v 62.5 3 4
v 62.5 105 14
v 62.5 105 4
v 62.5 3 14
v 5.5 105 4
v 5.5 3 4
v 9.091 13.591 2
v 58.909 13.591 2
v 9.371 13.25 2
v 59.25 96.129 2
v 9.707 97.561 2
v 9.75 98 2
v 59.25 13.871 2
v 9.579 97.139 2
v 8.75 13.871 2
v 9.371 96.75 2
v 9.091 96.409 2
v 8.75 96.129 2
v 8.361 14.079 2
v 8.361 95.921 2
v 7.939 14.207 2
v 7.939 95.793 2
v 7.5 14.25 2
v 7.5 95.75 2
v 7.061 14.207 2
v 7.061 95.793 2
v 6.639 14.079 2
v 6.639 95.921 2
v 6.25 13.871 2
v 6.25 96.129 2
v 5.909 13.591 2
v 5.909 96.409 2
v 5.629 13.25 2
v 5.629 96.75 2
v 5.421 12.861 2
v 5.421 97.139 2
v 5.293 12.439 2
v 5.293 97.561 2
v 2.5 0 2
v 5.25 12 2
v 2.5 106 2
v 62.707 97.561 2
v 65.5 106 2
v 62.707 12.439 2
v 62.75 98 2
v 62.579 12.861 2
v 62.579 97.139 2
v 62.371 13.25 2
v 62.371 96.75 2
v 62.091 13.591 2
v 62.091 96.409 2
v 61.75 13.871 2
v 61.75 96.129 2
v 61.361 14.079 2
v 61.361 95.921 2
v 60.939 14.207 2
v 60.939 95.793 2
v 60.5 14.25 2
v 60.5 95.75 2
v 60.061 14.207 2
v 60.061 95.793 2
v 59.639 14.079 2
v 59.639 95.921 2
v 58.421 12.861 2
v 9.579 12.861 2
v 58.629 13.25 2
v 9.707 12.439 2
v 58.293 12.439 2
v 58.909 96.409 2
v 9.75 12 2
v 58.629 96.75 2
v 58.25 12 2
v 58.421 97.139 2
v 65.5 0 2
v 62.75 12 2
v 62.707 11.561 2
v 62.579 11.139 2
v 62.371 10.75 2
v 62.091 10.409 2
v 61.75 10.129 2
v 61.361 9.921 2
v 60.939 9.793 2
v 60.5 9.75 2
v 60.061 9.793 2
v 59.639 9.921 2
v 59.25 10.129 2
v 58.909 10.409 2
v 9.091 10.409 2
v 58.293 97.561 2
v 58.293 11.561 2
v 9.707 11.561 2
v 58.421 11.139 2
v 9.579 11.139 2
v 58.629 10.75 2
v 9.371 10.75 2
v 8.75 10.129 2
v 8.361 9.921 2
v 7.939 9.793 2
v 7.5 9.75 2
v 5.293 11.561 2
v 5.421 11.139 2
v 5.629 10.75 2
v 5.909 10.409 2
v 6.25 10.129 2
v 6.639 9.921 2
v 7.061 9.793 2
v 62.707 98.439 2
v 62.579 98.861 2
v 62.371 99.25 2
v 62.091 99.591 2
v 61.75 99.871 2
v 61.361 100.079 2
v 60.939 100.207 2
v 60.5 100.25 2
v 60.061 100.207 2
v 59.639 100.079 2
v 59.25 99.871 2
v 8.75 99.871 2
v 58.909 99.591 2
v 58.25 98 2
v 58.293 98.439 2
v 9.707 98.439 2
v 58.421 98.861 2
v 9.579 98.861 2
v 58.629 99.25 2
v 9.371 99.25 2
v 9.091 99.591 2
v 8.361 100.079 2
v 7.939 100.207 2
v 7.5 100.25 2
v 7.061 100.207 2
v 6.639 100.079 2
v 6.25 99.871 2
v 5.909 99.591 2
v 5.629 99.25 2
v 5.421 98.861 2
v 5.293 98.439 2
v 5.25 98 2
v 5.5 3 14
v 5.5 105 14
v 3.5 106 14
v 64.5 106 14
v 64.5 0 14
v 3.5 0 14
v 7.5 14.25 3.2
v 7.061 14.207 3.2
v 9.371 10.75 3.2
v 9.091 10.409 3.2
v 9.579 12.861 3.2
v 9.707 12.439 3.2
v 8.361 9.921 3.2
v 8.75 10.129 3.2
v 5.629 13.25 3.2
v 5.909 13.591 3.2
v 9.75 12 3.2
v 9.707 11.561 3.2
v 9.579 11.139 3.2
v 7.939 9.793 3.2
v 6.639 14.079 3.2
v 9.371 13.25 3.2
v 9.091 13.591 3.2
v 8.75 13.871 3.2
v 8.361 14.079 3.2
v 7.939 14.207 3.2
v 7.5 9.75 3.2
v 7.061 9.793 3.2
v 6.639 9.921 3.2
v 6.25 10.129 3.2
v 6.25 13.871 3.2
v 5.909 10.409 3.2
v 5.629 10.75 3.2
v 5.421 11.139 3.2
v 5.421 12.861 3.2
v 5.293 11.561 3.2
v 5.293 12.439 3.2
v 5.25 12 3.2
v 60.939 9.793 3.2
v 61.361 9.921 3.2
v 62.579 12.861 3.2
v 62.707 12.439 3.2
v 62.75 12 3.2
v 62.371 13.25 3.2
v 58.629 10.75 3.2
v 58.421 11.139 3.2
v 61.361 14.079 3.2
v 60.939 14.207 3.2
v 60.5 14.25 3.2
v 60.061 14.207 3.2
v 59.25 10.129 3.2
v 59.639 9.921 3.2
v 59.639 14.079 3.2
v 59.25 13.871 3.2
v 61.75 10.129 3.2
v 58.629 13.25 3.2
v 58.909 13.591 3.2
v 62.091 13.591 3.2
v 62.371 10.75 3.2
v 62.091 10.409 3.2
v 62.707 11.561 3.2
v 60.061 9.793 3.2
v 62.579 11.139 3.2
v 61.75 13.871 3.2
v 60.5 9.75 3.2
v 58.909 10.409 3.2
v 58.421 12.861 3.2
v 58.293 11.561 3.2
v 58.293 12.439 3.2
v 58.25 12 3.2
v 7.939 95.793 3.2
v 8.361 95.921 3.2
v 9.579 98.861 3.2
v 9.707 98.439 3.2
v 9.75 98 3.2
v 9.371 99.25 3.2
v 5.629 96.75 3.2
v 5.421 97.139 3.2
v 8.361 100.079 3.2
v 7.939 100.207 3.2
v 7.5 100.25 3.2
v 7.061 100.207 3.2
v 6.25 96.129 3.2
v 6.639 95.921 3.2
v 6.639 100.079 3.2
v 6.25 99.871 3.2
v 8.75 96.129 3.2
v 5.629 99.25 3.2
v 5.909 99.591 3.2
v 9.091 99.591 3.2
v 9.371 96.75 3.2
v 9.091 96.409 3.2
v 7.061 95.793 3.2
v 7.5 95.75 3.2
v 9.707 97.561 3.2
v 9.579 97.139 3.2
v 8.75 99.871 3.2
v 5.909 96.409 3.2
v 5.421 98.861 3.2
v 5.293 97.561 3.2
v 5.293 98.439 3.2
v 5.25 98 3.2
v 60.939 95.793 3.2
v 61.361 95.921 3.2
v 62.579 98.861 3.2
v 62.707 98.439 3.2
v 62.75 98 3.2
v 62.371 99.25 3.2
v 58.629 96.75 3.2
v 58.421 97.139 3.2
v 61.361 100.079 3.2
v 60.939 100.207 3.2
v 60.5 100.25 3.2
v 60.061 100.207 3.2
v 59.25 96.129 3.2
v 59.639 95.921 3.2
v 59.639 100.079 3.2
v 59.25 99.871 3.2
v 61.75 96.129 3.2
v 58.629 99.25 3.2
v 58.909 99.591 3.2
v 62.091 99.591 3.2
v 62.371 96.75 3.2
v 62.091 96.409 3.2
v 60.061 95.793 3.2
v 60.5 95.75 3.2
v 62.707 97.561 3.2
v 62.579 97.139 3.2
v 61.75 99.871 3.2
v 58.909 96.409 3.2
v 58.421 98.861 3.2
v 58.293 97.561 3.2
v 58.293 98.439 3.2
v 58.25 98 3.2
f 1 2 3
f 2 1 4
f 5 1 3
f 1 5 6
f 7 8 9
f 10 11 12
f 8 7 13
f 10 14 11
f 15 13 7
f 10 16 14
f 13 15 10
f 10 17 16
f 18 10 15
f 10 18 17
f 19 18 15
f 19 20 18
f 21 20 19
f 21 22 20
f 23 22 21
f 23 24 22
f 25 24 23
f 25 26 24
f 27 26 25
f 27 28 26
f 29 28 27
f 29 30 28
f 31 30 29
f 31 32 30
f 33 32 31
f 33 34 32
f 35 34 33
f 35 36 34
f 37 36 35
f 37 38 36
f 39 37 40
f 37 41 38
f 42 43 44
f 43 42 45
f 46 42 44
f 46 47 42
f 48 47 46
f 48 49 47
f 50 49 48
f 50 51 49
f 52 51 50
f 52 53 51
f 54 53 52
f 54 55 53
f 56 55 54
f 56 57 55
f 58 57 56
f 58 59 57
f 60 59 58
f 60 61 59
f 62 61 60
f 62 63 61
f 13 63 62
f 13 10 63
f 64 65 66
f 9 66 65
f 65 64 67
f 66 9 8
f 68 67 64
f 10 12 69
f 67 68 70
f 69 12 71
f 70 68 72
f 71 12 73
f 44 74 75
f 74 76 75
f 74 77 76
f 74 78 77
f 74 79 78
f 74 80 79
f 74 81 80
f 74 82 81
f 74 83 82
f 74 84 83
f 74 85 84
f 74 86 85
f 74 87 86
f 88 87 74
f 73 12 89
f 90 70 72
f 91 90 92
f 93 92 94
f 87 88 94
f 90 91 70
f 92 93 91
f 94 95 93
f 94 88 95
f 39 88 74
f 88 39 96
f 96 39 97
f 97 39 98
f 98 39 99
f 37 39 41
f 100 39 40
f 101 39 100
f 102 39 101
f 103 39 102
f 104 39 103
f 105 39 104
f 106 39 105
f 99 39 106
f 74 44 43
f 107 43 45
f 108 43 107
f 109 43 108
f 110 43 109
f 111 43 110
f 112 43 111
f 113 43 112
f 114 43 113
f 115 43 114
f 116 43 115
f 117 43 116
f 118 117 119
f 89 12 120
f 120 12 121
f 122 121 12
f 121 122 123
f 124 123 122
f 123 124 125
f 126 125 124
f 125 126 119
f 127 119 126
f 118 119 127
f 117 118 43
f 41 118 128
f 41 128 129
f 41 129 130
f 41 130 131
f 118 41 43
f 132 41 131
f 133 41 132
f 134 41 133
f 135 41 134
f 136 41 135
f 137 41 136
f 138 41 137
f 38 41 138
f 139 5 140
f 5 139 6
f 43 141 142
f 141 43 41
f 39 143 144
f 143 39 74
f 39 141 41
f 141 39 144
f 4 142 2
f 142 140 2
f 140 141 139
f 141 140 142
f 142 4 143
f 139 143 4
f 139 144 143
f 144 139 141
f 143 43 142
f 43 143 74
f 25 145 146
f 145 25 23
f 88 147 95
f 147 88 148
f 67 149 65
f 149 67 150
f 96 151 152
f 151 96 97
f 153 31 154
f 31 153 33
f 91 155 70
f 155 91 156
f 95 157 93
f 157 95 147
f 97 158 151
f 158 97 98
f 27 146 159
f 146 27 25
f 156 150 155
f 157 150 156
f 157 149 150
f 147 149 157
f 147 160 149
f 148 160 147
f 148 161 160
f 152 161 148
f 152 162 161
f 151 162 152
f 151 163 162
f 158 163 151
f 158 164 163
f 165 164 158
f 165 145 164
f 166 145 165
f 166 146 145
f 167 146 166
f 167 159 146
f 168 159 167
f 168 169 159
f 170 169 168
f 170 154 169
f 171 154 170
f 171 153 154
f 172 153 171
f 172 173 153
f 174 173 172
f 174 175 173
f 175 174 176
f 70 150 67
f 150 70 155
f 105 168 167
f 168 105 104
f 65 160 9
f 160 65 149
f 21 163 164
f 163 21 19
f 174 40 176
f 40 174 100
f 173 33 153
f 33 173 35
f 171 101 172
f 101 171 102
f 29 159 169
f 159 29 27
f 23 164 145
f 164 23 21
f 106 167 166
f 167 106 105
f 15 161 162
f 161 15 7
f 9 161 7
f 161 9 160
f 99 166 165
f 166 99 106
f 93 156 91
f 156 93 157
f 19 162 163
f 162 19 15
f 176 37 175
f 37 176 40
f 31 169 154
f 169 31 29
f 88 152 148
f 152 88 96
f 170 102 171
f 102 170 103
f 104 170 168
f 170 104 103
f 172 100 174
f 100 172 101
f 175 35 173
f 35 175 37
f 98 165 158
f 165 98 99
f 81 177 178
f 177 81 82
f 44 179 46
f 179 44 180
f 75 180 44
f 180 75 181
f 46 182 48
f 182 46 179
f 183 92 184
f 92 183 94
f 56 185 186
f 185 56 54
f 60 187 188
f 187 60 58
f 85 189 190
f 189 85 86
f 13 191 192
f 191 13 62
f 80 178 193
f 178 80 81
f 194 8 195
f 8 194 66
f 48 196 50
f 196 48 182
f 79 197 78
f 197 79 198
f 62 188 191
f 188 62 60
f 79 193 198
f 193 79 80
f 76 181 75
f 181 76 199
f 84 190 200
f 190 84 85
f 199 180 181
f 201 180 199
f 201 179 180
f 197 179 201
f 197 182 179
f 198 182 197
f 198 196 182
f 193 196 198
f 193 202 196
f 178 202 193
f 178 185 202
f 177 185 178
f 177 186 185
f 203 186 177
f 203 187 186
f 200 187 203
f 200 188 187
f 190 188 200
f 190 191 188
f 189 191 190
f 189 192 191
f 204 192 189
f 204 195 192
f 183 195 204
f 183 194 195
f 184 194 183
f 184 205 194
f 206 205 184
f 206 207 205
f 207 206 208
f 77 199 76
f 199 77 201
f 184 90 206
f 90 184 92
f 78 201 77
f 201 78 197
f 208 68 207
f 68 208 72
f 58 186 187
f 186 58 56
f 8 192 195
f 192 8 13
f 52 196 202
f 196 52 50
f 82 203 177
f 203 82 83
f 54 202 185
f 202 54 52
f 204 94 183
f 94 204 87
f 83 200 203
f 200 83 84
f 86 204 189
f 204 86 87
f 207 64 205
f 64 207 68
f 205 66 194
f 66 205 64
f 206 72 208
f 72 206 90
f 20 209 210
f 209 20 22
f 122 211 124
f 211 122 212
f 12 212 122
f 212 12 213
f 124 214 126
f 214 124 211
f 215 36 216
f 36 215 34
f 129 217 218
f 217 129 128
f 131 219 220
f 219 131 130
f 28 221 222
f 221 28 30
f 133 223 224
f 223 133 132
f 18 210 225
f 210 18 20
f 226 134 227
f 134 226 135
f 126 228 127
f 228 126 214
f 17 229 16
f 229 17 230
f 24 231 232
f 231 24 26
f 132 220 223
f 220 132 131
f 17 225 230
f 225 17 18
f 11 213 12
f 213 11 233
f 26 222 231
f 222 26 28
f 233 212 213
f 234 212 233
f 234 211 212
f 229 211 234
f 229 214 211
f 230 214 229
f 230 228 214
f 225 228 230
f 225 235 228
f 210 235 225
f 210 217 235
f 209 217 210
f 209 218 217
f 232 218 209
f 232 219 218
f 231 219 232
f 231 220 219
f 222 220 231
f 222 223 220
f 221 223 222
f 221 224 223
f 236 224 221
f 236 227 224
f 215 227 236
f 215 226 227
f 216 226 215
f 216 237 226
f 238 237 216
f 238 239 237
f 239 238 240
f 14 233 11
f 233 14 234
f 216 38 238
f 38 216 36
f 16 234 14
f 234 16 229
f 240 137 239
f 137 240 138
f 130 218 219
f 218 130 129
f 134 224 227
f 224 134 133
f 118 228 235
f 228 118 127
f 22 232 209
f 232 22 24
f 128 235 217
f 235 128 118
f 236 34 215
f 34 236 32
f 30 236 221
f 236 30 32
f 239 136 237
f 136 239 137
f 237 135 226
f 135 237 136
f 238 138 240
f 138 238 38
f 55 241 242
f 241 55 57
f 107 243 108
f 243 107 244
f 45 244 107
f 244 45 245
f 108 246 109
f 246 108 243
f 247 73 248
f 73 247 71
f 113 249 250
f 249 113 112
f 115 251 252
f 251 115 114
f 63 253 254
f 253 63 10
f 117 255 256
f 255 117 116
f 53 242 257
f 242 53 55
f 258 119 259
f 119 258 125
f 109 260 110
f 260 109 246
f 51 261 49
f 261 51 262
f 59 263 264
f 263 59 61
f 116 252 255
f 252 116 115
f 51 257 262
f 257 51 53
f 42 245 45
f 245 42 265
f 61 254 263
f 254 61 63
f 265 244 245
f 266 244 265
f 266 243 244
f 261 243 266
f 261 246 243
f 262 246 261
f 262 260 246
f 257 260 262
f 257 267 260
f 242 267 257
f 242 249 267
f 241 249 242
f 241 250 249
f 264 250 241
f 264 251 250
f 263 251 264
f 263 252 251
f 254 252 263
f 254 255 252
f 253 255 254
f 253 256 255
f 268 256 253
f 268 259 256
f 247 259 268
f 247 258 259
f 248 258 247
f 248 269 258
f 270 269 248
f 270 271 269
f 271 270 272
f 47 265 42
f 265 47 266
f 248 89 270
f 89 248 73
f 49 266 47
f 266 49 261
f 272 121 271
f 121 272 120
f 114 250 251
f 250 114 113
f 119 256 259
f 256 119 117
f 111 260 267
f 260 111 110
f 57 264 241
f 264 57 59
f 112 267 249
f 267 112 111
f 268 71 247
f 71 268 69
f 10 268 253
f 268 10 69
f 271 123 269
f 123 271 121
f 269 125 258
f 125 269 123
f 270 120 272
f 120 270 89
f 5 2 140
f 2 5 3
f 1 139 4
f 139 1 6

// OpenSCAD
// file: Commons.scad
arduino_depth = 53.5;
arduino_width = 69;
arduino_mega_width = 102;

raspberry_depth = 56;
raspberry_width = 85;

breadboard_width = 166;
breadboard_depth = 55;
breadboard_height = 10;

mini_breadboard_depth = 34;
mini_breadboard_width = 46;

magnet_height = 1.2;
magnet_diameter = 4;

delta = 0.5;

plate_thickness = 2;
wall_thickness = 2;

slot_width = arduino_mega_width + 2*wall_thickness; // 106
slot_depth = raspberry_depth + 2*wall_thickness + 2 + 2*delta; // 63

width = 2*slot_width + wall_thickness; // 214
depth = slot_depth + breadboard_depth + 3*wall_thickness + 1 + 4*delta; // 125
height = breadboard_height + plate_thickness; // height over plate, 12

small_slot_depth = depth - slot_depth - 2*wall_thickness - 2*delta; // 58
small_slot_width = width - breadboard_width - 3*wall_thickness - 1 - 4*delta; // 39


module module_frame() {
    difference() {
        union() {
            translate([wall_thickness + 1, 0, 0])
                cube([slot_depth - 2*wall_thickness - 2, slot_width, plate_thickness]);

            translate([0, slot_width, 0]) rotate([90, 0, 0]) linear_extrude(slot_width)
                polygon([[0, 0], [1, height], [3, height], [3, 0]]);

            translate([slot_depth - wall_thickness - 1, slot_width, 0]) rotate([90, 0, 0]) linear_extrude(slot_width)
                polygon([[0, 0], [0, height], [wall_thickness, height], [3, 0]]);
        }
        
        magnet_hole(5, wall_thickness + 10, -delta);
        magnet_hole(slot_depth - 5, wall_thickness + 10, -delta);
        magnet_hole(5, wall_thickness + slot_width - 10, -delta);
        magnet_hole(slot_depth - 5, wall_thickness + slot_width - 10, -delta);       
    }

    translate([wall_thickness + 1, slot_width - 1, plate_thickness])
        cube([slot_depth - 2*wall_thickness - 2, 1, height - plate_thickness]);
}

module small_module_frame() {
    difference() {
        union() {
            translate([0, wall_thickness + 1, 0])
                cube([small_slot_depth, small_slot_width - 2*wall_thickness - 2, plate_thickness]);

            rotate([90, 0, 90]) linear_extrude(small_slot_depth)
                polygon([[0, 0], [1, height], [wall_thickness + 1, height], [wall_thickness + 1, 0]]);

            translate([0, small_slot_width - wall_thickness - 1, 0]) rotate([90, 0, 90]) linear_extrude(small_slot_depth)
                polygon([[0, 0], [0, height], [wall_thickness, height], [wall_thickness + 1, 0]]);

            translate([0, wall_thickness + 1, 0])
                cube([1, small_slot_width - 2*wall_thickness - 2, height]);
        }
        
        magnet_hole(8, 8, -delta);
        magnet_hole(8, small_slot_width - 8, -delta);
        magnet_hole(small_slot_depth - 8, 8, -delta);
        magnet_hole(small_slot_depth - 8, small_slot_width - 8, -delta);
    }
}

module breadboard_hole() {
    cube([breadboard_depth + 2*delta, breadboard_width + 2*delta, breadboard_height + delta]);
    
    translate([breadboard_depth - delta, 11 + delta, 0])
        cube([2.5, 6, breadboard_height + delta]);
    translate([breadboard_depth - delta, breadboard_width/2 - 3 + delta, 0])
        cube([2.5, 6, breadboard_height + delta]);
    translate([breadboard_depth - delta, breadboard_width - 17 - delta, 0])
        cube([2.5, 6, breadboard_height + delta]);
}

module half_breadboard_hole() {
    cube([breadboard_depth + 2*delta, breadboard_width/2 + 2*delta, breadboard_height + delta]);
    
    translate([-2, 11 + delta, 0])
        cube([2.5, 6, breadboard_height + delta]);
    translate([-2, breadboard_width/2 - 17 - delta, 0])
        cube([2.5, 6, breadboard_height + delta]);
    translate([2 + delta, -2, 0])
        cube([6, 2.5, breadboard_height + delta]);
    translate([breadboard_depth/2 - 3 + delta, -2, 0])
        cube([6, 2.5, breadboard_height + delta]);
    translate([breadboard_depth - 8 - delta, -2, 0])
        cube([6, 2.5, breadboard_height + delta]);
}

module mini_breadboard_hole() {
    cube([mini_breadboard_depth + 2*delta, mini_breadboard_width + 2*delta, breadboard_height + delta]);
    
    translate([-2, mini_breadboard_width/2 - 3 + delta, 0])
        cube([2.5, 6, breadboard_height + delta]);
    translate([mini_breadboard_depth/2 - 3 + delta, mini_breadboard_width + 2*delta - 0.5, 0])
        cube([6, 2.5, breadboard_height + delta]);
}

module magnet_hole(x, y, z) {
    translate([x, y, z])
        cylinder(h = magnet_height + delta, d = magnet_diameter + delta, $fn=32);
}

module screw_mount(x = 0, y = 0, z = 0, h = 5) {
    holeRadius = 3 / 2;

    translate([x, y, z])
        difference() {
            cylinder(h, r1 = holeRadius + 2, r2 = holeRadius + 1);
            
            translate([0, 0, -0.5])
                cylinder(h + 1, r = holeRadius);
        }
}
// main file
include <Commons.scad>

translate([wall_thickness + delta, 0, plate_thickness])
    Tray_Module();


module Tray_Module() {
    module_frame();

    translate([wall_thickness, 0, 0])
        cube([slot_depth - 2*wall_thickness, wall_thickness + 1, height]);
}
